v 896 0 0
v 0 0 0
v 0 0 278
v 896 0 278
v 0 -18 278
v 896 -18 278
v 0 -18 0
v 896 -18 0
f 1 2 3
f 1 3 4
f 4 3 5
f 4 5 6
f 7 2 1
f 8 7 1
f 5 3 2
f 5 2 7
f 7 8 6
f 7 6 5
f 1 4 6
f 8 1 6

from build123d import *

# Parameters (mm, degrees)
F0_W     = 63.8693869114
F0_H     = 55.2091002464
F1_DEPTH = 18
F2_DEPTH = 896
F3_DEPTH = 280
F4_DEPTH = 25
F5_DEPTH = 2


with BuildPart() as f1:
    # F0 (on Front) → F1 (new body)
    with BuildSketch(Plane.XZ):
        with Locations((31.9346934557, 27.6045501232)):
            Rectangle(F0_W, F0_H)
    extrude(amount=F1_DEPTH)

    # F2 (add): a face of the model
    f2_faces = [f1.faces().sort_by_distance(p)[0] for p in [
        (0, -9, 27.6045501232),
    ]]
    extrude(f2_faces, amount=-F2_DEPTH)

    # F3 (add): a face of the model
    f3_faces = [f1.faces().sort_by_distance(p)[0] for p in [
        (448, -9, 0),
    ]]
    extrude(f3_faces, amount=-F3_DEPTH)

    # F4 (add): a face of the model
    f4_faces = [f1.faces().sort_by_distance(p)[0] for p in [
        (448, -9, 0),
    ]]
    extrude(f4_faces, amount=-F4_DEPTH)

    # F5 (cut): a face of the model
    f5_faces = [f1.faces().sort_by_distance(p)[0] for p in [
        (448, -9, 280),
    ]]
    extrude(f5_faces, amount=-F5_DEPTH, mode=Mode.SUBTRACT)


solid = f1.part
